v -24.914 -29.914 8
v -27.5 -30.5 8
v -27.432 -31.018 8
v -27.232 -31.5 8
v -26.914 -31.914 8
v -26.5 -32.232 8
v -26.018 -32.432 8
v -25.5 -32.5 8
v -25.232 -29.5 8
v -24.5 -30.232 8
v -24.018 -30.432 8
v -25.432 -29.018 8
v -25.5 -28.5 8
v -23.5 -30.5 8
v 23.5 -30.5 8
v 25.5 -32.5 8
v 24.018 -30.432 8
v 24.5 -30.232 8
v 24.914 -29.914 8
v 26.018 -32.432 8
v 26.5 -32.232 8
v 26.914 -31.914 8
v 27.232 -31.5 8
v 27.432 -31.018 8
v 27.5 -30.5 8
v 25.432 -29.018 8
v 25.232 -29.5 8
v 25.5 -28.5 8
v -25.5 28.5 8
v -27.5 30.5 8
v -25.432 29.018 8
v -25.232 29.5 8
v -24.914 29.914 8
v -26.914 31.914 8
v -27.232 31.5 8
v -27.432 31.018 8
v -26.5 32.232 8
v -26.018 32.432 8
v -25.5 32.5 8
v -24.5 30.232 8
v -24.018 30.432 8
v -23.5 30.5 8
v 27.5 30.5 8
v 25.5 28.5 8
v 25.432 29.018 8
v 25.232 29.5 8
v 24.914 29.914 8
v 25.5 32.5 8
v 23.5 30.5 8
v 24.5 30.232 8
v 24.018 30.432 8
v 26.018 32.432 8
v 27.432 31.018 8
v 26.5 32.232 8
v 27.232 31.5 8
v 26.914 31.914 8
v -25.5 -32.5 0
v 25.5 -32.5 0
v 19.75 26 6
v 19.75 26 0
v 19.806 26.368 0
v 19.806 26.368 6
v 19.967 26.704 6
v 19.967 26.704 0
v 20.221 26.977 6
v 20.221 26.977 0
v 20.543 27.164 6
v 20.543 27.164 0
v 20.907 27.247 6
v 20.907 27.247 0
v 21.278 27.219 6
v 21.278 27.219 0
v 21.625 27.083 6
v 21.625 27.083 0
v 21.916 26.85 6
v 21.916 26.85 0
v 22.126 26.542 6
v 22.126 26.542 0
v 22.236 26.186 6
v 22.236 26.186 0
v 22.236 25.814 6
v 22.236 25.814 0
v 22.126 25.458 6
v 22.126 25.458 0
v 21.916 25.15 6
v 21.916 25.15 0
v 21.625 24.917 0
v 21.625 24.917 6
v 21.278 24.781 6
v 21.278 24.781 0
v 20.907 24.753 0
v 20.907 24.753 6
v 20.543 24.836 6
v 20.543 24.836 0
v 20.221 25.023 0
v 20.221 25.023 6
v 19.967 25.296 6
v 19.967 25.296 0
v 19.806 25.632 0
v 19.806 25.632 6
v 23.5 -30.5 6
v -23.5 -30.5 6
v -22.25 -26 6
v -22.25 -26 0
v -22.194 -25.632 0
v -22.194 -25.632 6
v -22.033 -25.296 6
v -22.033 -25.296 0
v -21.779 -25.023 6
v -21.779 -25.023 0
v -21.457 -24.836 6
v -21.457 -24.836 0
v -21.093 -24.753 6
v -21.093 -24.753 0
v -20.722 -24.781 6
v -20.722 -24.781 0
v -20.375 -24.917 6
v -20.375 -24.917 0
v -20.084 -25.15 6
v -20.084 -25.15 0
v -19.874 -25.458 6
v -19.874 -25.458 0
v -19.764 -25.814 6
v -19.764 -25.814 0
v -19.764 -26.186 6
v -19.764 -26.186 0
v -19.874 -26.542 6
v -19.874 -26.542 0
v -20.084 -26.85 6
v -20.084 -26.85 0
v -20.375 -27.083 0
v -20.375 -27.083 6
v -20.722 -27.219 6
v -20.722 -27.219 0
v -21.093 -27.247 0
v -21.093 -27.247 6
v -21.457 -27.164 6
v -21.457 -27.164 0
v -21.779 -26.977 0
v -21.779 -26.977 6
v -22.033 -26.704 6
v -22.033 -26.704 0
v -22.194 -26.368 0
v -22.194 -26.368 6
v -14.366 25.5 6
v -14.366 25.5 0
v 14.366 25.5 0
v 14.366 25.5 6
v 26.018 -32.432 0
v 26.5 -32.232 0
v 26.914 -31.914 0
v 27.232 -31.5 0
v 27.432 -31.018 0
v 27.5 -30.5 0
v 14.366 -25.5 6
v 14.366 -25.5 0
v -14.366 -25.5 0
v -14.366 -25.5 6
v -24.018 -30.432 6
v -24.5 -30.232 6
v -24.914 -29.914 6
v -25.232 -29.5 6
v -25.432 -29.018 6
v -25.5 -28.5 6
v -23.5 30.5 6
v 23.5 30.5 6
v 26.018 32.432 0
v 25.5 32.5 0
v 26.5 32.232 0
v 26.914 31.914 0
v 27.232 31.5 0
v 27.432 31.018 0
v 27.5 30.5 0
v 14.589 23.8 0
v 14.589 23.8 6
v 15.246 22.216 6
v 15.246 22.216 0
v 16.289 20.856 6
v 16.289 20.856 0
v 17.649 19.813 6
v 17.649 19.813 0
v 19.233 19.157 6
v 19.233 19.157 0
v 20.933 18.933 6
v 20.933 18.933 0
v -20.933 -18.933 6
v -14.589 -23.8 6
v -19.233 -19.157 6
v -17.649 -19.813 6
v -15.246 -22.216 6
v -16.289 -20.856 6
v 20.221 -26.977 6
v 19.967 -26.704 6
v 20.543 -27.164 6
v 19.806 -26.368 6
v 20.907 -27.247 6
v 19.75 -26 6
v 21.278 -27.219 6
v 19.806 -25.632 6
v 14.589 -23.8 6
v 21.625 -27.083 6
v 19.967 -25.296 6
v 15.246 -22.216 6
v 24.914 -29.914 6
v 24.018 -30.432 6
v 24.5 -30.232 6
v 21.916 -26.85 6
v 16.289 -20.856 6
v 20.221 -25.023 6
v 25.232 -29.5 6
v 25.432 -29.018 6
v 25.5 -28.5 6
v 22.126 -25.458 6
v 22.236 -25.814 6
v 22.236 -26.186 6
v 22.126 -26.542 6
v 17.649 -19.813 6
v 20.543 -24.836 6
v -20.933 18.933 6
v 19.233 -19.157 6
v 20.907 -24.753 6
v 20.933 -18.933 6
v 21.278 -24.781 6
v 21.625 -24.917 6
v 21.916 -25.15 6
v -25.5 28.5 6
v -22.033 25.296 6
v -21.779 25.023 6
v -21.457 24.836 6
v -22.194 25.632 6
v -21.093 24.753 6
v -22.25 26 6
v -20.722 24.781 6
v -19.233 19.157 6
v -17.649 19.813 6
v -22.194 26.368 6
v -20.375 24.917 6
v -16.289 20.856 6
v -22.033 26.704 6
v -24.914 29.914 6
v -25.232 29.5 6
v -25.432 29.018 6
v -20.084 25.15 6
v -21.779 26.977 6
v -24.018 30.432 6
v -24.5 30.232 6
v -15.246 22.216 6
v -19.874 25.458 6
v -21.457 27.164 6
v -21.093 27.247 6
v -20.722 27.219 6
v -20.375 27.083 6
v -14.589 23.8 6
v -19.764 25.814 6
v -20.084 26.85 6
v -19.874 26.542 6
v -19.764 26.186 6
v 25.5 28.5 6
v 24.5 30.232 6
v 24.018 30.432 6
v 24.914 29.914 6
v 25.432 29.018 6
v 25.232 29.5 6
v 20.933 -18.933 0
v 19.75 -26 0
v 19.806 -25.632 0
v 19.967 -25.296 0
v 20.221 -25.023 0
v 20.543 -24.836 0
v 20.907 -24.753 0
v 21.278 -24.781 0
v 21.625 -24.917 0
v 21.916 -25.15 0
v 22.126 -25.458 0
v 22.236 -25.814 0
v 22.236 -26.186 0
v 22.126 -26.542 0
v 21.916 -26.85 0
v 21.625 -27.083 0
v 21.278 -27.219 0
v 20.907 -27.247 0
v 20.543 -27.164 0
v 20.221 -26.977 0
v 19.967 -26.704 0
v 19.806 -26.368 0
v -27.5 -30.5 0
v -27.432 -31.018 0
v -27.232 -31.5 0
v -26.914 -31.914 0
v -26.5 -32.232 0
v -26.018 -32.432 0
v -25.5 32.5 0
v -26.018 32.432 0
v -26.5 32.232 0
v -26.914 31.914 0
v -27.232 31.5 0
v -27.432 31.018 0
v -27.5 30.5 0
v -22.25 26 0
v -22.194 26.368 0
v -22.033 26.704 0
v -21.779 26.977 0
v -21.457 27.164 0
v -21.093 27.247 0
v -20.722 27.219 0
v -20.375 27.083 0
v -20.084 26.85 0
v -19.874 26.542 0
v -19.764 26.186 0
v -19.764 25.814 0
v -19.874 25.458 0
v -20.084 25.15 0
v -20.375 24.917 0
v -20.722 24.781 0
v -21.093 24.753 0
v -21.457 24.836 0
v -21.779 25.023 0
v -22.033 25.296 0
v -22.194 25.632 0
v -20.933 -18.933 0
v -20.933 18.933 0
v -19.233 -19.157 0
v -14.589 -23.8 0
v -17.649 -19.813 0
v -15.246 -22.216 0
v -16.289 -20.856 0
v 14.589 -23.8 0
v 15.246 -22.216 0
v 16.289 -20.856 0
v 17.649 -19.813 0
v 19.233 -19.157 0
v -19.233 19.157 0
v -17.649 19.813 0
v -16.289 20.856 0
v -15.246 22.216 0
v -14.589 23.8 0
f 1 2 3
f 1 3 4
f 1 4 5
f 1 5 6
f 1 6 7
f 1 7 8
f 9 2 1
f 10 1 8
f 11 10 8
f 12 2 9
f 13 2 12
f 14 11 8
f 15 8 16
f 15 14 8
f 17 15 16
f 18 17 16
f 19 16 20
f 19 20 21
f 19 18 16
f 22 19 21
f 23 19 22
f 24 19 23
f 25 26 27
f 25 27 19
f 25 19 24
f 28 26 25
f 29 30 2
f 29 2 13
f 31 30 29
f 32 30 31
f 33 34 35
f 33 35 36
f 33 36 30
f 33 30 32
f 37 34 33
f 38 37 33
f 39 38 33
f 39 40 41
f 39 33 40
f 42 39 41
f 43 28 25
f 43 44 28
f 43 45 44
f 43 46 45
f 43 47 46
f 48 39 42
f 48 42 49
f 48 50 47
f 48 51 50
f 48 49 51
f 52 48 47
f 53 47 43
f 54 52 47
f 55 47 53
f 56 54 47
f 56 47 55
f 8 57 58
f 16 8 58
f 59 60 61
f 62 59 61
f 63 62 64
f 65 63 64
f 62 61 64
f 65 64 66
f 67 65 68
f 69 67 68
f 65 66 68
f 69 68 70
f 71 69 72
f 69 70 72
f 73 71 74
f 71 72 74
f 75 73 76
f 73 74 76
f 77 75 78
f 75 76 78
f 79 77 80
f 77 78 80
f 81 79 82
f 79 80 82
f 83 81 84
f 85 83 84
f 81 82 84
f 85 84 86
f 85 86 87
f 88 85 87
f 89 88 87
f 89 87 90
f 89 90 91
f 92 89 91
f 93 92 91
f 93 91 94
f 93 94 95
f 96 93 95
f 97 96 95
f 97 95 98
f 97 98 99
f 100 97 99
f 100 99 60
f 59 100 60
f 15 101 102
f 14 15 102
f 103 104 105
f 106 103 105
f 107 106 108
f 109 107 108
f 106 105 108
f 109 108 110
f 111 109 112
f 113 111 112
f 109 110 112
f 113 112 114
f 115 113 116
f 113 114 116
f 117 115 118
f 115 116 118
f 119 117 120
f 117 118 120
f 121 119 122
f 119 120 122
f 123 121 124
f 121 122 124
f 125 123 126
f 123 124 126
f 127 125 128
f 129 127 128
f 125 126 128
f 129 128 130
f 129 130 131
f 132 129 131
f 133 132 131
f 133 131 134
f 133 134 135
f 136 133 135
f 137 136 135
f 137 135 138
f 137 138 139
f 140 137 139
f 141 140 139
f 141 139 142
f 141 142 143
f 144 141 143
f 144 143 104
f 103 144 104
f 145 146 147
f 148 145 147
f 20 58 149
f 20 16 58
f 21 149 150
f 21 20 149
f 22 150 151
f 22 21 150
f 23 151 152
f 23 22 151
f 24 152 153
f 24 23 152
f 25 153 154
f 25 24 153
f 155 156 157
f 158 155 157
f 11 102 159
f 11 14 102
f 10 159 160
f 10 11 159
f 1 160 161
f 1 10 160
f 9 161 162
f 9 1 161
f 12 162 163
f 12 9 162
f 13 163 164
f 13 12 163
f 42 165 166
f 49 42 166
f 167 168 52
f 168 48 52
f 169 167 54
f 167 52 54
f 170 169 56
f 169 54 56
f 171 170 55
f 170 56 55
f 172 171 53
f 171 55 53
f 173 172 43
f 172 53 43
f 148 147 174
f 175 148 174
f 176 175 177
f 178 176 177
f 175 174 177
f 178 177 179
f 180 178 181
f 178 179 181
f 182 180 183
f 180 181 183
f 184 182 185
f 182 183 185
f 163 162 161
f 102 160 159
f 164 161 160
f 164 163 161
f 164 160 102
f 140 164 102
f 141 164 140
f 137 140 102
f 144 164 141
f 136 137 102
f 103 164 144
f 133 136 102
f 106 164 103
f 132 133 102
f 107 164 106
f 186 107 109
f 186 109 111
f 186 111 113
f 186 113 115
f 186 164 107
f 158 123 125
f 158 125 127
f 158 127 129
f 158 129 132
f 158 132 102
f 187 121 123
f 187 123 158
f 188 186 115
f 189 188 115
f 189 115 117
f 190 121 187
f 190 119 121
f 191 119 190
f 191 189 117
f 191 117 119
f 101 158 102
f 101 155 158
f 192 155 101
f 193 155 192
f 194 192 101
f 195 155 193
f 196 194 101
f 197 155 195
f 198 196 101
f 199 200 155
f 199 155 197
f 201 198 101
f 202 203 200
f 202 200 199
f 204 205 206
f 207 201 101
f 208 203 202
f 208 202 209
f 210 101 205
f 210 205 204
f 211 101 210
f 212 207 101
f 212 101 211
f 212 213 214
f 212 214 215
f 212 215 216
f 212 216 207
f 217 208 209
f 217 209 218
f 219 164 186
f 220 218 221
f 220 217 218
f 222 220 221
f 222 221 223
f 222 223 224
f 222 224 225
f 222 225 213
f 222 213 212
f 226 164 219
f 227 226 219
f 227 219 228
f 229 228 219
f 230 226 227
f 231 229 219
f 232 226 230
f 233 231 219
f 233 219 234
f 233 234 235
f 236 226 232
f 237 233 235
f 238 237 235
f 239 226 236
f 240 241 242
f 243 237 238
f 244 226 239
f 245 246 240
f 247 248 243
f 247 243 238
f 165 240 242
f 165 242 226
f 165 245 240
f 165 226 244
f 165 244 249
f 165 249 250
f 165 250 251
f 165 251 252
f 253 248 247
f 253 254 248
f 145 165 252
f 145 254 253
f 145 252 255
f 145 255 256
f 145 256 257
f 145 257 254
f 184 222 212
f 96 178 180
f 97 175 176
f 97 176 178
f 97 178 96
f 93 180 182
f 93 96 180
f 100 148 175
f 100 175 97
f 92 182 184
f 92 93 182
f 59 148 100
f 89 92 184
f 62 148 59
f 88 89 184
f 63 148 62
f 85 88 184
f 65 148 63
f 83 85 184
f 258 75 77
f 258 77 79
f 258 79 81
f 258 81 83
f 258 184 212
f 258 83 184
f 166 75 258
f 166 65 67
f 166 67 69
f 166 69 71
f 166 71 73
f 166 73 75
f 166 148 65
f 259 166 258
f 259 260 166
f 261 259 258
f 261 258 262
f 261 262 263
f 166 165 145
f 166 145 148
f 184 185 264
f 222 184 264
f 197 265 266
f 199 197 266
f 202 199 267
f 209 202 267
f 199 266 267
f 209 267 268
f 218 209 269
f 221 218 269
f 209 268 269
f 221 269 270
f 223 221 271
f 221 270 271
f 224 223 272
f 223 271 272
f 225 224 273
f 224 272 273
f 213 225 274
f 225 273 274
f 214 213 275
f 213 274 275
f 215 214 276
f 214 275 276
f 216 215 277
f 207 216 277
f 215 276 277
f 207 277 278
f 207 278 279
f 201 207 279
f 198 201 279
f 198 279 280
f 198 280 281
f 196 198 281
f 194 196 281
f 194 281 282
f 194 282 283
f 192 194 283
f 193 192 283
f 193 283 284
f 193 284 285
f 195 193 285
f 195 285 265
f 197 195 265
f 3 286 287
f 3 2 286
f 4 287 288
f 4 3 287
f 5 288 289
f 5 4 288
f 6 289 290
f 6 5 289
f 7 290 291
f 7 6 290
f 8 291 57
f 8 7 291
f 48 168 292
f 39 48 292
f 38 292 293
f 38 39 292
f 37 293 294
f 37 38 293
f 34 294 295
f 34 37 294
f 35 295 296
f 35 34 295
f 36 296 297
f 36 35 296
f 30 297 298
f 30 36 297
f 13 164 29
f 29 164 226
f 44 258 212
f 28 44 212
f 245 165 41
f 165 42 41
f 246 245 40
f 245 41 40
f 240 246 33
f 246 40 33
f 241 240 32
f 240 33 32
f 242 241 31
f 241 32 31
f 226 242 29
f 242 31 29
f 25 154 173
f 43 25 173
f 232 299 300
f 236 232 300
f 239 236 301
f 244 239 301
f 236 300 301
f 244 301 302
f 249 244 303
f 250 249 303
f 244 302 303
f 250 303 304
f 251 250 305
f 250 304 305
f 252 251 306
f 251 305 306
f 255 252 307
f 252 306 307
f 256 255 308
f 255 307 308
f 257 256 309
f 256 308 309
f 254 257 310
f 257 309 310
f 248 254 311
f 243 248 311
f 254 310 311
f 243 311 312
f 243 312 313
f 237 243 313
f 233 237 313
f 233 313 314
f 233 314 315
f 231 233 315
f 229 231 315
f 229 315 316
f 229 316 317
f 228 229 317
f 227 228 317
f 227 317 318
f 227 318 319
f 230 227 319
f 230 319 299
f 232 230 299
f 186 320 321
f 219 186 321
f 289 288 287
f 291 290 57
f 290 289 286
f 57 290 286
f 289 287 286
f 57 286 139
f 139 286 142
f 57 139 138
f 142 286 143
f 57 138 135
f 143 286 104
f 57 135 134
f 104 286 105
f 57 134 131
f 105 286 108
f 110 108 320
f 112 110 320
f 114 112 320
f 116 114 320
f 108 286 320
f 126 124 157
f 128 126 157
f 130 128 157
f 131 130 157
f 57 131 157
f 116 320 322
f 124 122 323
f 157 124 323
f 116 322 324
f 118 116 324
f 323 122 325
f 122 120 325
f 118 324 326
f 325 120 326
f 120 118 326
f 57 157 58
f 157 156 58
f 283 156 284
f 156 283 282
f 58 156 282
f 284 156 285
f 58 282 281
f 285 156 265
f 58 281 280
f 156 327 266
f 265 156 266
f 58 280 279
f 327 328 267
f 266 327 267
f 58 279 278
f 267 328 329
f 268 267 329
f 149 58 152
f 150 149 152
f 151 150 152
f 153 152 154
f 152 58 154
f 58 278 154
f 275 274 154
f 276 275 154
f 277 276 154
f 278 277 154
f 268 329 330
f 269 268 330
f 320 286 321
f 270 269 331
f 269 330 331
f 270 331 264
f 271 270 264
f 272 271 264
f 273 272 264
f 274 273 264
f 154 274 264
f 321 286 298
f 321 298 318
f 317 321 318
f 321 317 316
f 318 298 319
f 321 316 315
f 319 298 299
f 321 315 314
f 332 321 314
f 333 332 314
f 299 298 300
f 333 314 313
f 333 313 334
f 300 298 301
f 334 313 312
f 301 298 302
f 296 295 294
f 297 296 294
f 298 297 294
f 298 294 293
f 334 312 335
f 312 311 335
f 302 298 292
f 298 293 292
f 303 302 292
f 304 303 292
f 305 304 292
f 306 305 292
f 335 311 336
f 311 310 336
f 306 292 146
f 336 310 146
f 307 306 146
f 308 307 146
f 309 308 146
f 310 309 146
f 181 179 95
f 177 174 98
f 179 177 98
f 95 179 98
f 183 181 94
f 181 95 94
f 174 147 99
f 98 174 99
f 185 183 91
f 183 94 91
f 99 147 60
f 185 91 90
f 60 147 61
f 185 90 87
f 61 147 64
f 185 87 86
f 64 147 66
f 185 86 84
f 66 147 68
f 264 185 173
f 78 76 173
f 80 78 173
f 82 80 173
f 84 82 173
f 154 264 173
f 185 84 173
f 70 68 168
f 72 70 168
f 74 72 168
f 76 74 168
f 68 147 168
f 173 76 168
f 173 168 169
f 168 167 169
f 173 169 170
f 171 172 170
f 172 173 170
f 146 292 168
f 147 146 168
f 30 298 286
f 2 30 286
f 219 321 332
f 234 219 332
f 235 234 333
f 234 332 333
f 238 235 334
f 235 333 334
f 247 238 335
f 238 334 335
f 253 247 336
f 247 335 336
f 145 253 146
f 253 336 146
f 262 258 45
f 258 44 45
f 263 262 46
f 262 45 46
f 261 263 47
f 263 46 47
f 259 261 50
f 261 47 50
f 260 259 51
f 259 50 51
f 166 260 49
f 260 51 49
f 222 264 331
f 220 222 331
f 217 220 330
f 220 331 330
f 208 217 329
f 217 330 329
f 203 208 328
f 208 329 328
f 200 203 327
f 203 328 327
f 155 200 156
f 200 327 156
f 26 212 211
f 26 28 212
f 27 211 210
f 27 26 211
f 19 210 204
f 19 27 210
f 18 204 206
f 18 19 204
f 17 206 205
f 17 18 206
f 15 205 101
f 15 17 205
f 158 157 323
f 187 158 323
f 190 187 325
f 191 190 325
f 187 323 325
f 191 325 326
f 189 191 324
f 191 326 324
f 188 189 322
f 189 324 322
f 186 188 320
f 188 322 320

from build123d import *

# Parameters (mm, degrees)
F1_DEPTH = 6
F2_DEPTH = 8
F4_D     = 2.5
F4_DEPTH = 150
F4_TIP   = 0.7510757738
F5_R     = 2


with BuildPart() as f1:
    # F0 (on Top) → F1 (new body)
    with BuildSketch(Plane.XY):
        with BuildLine():
            Line((-20.9328360941, 18.9328360941), (-20.9328360941, 25.5))
            Line((-20.9328360941, 25.5), (-14.3656721882, 25.5))
            ThreePointArc((-14.3656721882, 25.5), (-14.9709415927, 28.2538074954), (-16.6751792541, 30.5))
            Line((-16.6751792541, 30.5), (-25.1904929341, 30.5))
            ThreePointArc((-25.1904929341, 30.5), (-25.3474833162, 30.3619473127), (-25.5, 30.2189676438))
            Line((-25.5, 30.2189676438), (-25.5, 20.7810323562))
            ThreePointArc((-25.5, 20.7810323562), (-23.3963100419, 19.4123947339), (-20.9328360941, 18.9328360941))
        make_face()
        with BuildLine():
            Line((-14.3656721882, 25.5), (-20.9328360941, 25.5))
            Line((-20.9328360941, 25.5), (-20.9328360941, 18.9328360941))
            ThreePointArc((-20.9328360941, 18.9328360941), (-16.289149963, 20.856313869), (-14.3656721882, 25.5))
        make_face()
        with BuildLine():
            ThreePointArc((-16.6751792541, 30.5), (-14.9709415927, 28.2538074954), (-14.3656721882, 25.5))
            Line((-14.3656721882, 25.5), (14.3656721882, 25.5))
            ThreePointArc((14.3656721882, 25.5), (14.9709415927, 28.2538074954), (16.6751792541, 30.5))
            Line((16.6751792541, 30.5), (-16.6751792541, 30.5))
        make_face()
        with BuildLine():
            ThreePointArc((16.6751792541, 30.5), (14.9709415927, 28.2538074954), (14.3656721882, 25.5))
            Line((14.3656721882, 25.5), (20.9328360941, 25.5))
            Line((20.9328360941, 25.5), (20.9328360941, 18.9328360941))
            ThreePointArc((20.9328360941, 18.9328360941), (23.3963100419, 19.4123947339), (25.5, 20.7810323562))
            Line((25.5, 20.7810323562), (25.5, 30.2189676438))
            ThreePointArc((25.5, 30.2189676438), (25.3474833162, 30.3619473127), (25.1904929341, 30.5))
            Line((25.1904929341, 30.5), (16.6751792541, 30.5))
        make_face()
        with BuildLine():
            Line((20.9328360941, 25.5), (14.3656721882, 25.5))
            ThreePointArc((14.3656721882, 25.5), (16.289149963, 20.856313869), (20.9328360941, 18.9328360941))
            Line((20.9328360941, 18.9328360941), (20.9328360941, 25.5))
        make_face()
        with BuildLine():
            ThreePointArc((25.5, 20.7810323562), (23.3963100419, 19.4123947339), (20.9328360941, 18.9328360941))
            Line((20.9328360941, 18.9328360941), (20.9328360941, -18.9328360941))
            ThreePointArc((20.9328360941, -18.9328360941), (23.3963100419, -19.4123947339), (25.5, -20.7810323562))
            Line((25.5, -20.7810323562), (25.5, 20.7810323562))
        make_face()
        with BuildLine():
            ThreePointArc((25.5, -20.7810323562), (23.3963100419, -19.4123947339), (20.9328360941, -18.9328360941))
            Line((20.9328360941, -18.9328360941), (20.9328360941, -25.5))
            Line((20.9328360941, -25.5), (14.3656721882, -25.5))
            ThreePointArc((14.3656721882, -25.5), (14.9709415927, -28.2538074954), (16.6751792541, -30.5))
            Line((16.6751792541, -30.5), (25.1904929341, -30.5))
            ThreePointArc((25.1904929341, -30.5), (25.3474833162, -30.3619473127), (25.5, -30.2189676438))
            Line((25.5, -30.2189676438), (25.5, -20.7810323562))
        make_face()
        with BuildLine():
            Line((20.9328360941, -25.5), (20.9328360941, -18.9328360941))
            ThreePointArc((20.9328360941, -18.9328360941), (16.289149963, -20.856313869), (14.3656721882, -25.5))
            Line((14.3656721882, -25.5), (20.9328360941, -25.5))
        make_face()
        with BuildLine():
            Line((-20.9328360941, -25.5), (-20.9328360941, -18.9328360941))
            ThreePointArc((-20.9328360941, -18.9328360941), (-23.3963100419, -19.4123947339), (-25.5, -20.7810323562))
            Line((-25.5, -20.7810323562), (-25.5, -30.2189676438))
            ThreePointArc((-25.5, -30.2189676438), (-25.3474833162, -30.3619473127), (-25.1904929341, -30.5))
            Line((-25.1904929341, -30.5), (-16.6751792541, -30.5))
            ThreePointArc((-16.6751792541, -30.5), (-14.9709415927, -28.2538074954), (-14.3656721882, -25.5))
            Line((-14.3656721882, -25.5), (-20.9328360941, -25.5))
        make_face()
        with BuildLine():
            ThreePointArc((-14.3656721882, -25.5), (-16.289149963, -20.856313869), (-20.9328360941, -18.9328360941))
            Line((-20.9328360941, -18.9328360941), (-20.9328360941, -25.5))
            Line((-20.9328360941, -25.5), (-14.3656721882, -25.5))
        make_face()
        with BuildLine():
            Line((-20.9328360941, -18.9328360941), (-20.9328360941, 18.9328360941))
            ThreePointArc((-20.9328360941, 18.9328360941), (-23.3963100419, 19.4123947339), (-25.5, 20.7810323562))
            Line((-25.5, 20.7810323562), (-25.5, -20.7810323562))
            ThreePointArc((-25.5, -20.7810323562), (-23.3963100419, -19.4123947339), (-20.9328360941, -18.9328360941))
        make_face()
        with BuildLine():
            Line((14.3656721882, -25.5), (-14.3656721882, -25.5))
            ThreePointArc((-14.3656721882, -25.5), (-14.9709415927, -28.2538074954), (-16.6751792541, -30.5))
            Line((-16.6751792541, -30.5), (16.6751792541, -30.5))
            ThreePointArc((16.6751792541, -30.5), (14.9709415927, -28.2538074954), (14.3656721882, -25.5))
        make_face()
        with BuildLine():
            Line((25.5, 30.5), (25.1904929341, 30.5))
            ThreePointArc((25.1904929341, 30.5), (25.3474833162, 30.3619473127), (25.5, 30.2189676438))
            Line((25.5, 30.2189676438), (25.5, 30.5))
        make_face()
        with BuildLine():
            ThreePointArc((-25.5, 30.2189676438), (-25.3474833162, 30.3619473127), (-25.1904929341, 30.5))
            Line((-25.1904929341, 30.5), (-25.5, 30.5))
            Line((-25.5, 30.5), (-25.5, 30.2189676438))
        make_face()
        with BuildLine():
            ThreePointArc((-25.1904929341, -30.5), (-25.3474833162, -30.3619473127), (-25.5, -30.2189676438))
            Line((-25.5, -30.2189676438), (-25.5, -30.5))
            Line((-25.5, -30.5), (-25.1904929341, -30.5))
        make_face()
        with BuildLine():
            Line((25.5, -30.5), (25.5, -30.2189676438))
            ThreePointArc((25.5, -30.2189676438), (25.3474833162, -30.3619473127), (25.1904929341, -30.5))
            Line((25.1904929341, -30.5), (25.5, -30.5))
        make_face()
    extrude(amount=F1_DEPTH)

    # F0 (on Top) → F2 (join)
    with BuildSketch(Plane.XY):
        with BuildLine():
            ThreePointArc((-25.1904929341, 30.5), (-20.9328360941, 32.0671639059), (-16.6751792541, 30.5))
            Line((-16.6751792541, 30.5), (16.6751792541, 30.5))
            ThreePointArc((16.6751792541, 30.5), (20.9328360941, 32.0671639059), (25.1904929341, 30.5))
            Line((25.1904929341, 30.5), (25.5, 30.5))
            Line((25.5, 30.5), (25.5, 30.2189676438))
            ThreePointArc((25.5, 30.2189676438), (26.9793621927, 28.062647831), (27.5, 25.5))
            Line((27.5, 25.5), (27.5, 32.5))
            Line((27.5, 32.5), (-27.5, 32.5))
            Line((-27.5, 32.5), (-27.5, 25.5))
            ThreePointArc((-27.5, 25.5), (-26.9793621927, 28.062647831), (-25.5, 30.2189676438))
            Line((-25.5, 30.2189676438), (-25.5, 30.5))
            Line((-25.5, 30.5), (-25.1904929341, 30.5))
        make_face()
        with BuildLine():
            Line((-25.1904929341, 30.5), (-16.6751792541, 30.5))
            ThreePointArc((-16.6751792541, 30.5), (-20.9328360941, 32.0671639059), (-25.1904929341, 30.5))
        make_face()
        with BuildLine():
            ThreePointArc((-27.5, 25.5), (-26.9793621927, 22.937352169), (-25.5, 20.7810323562))
            Line((-25.5, 20.7810323562), (-25.5, 30.2189676438))
            ThreePointArc((-25.5, 30.2189676438), (-26.9793621927, 28.062647831), (-27.5, 25.5))
        make_face()
        with BuildLine():
            Line((-25.5, -20.7810323562), (-25.5, 20.7810323562))
            ThreePointArc((-25.5, 20.7810323562), (-26.9793621927, 22.937352169), (-27.5, 25.5))
            Line((-27.5, 25.5), (-27.5, -25.5))
            ThreePointArc((-27.5, -25.5), (-26.9793621927, -22.937352169), (-25.5, -20.7810323562))
        make_face()
        with BuildLine():
            Line((-25.5, -30.2189676438), (-25.5, -20.7810323562))
            ThreePointArc((-25.5, -20.7810323562), (-26.9793621927, -22.937352169), (-27.5, -25.5))
            ThreePointArc((-27.5, -25.5), (-26.9793621927, -28.062647831), (-25.5, -30.2189676438))
        make_face()
        with BuildLine():
            Line((16.6751792541, -30.5), (-16.6751792541, -30.5))
            ThreePointArc((-16.6751792541, -30.5), (-20.9328360941, -32.0671639059), (-25.1904929341, -30.5))
            Line((-25.1904929341, -30.5), (-25.5, -30.5))
            Line((-25.5, -30.5), (-25.5, -30.2189676438))
            ThreePointArc((-25.5, -30.2189676438), (-26.9793621927, -28.062647831), (-27.5, -25.5))
            Line((-27.5, -25.5), (-27.5, -32.5))
            Line((-27.5, -32.5), (27.5, -32.5))
            Line((27.5, -32.5), (27.5, -25.5))
            ThreePointArc((27.5, -25.5), (26.9793621927, -28.062647831), (25.5, -30.2189676438))
            Line((25.5, -30.2189676438), (25.5, -30.5))
            Line((25.5, -30.5), (25.1904929341, -30.5))
            ThreePointArc((25.1904929341, -30.5), (20.9328360941, -32.0671639059), (16.6751792541, -30.5))
        make_face()
        with BuildLine():
            ThreePointArc((-25.1904929341, -30.5), (-20.9328360941, -32.0671639059), (-16.6751792541, -30.5))
            Line((-16.6751792541, -30.5), (-25.1904929341, -30.5))
        make_face()
        with BuildLine():
            Line((25.1904929341, -30.5), (16.6751792541, -30.5))
            ThreePointArc((16.6751792541, -30.5), (20.9328360941, -32.0671639059), (25.1904929341, -30.5))
        make_face()
        with BuildLine():
            ThreePointArc((27.5, -25.5), (26.9793621927, -22.937352169), (25.5, -20.7810323562))
            Line((25.5, -20.7810323562), (25.5, -30.2189676438))
            ThreePointArc((25.5, -30.2189676438), (26.9793621927, -28.062647831), (27.5, -25.5))
        make_face()
        with BuildLine():
            ThreePointArc((25.1904929341, 30.5), (20.9328360941, 32.0671639059), (16.6751792541, 30.5))
            Line((16.6751792541, 30.5), (25.1904929341, 30.5))
        make_face()
        with BuildLine():
            Line((25.5, 30.2189676438), (25.5, 20.7810323562))
            ThreePointArc((25.5, 20.7810323562), (26.9793621927, 22.937352169), (27.5, 25.5))
            ThreePointArc((27.5, 25.5), (26.9793621927, 28.062647831), (25.5, 30.2189676438))
        make_face()
        with BuildLine():
            ThreePointArc((27.5, 25.5), (26.9793621927, 22.937352169), (25.5, 20.7810323562))
            Line((25.5, 20.7810323562), (25.5, -20.7810323562))
            ThreePointArc((25.5, -20.7810323562), (26.9793621927, -22.937352169), (27.5, -25.5))
            Line((27.5, -25.5), (27.5, 25.5))
        make_face()
    extrude(amount=F2_DEPTH)

    # F4
    with Locations(Plane.XY.offset(6)):
        with Locations((-21, 26), (21, 26), (21, -26), (-21, -26)):
            Hole(F4_D / 2, depth=F4_DEPTH)
            with Locations((0, 0, -(F4_DEPTH + F4_TIP / 2))):  # 118° drill point
                Cone(0, F4_D / 2, F4_TIP, mode=Mode.SUBTRACT)

    # F5
    f5_edges = [f1.edges().sort_by_distance(p)[0] for p in [
        (25.5, 30.5, 7),
        (25.5, -30.5, 7),
        (-25.5, -30.5, 7),
        (-25.5, 30.5, 7),
        (27.5, 32.5, 4),
        (27.5, -32.5, 4),
        (-27.5, -32.5, 4),
        (-27.5, 32.5, 4),
    ]]
    fillet(f5_edges, radius=F5_R)


solid = f1.part
